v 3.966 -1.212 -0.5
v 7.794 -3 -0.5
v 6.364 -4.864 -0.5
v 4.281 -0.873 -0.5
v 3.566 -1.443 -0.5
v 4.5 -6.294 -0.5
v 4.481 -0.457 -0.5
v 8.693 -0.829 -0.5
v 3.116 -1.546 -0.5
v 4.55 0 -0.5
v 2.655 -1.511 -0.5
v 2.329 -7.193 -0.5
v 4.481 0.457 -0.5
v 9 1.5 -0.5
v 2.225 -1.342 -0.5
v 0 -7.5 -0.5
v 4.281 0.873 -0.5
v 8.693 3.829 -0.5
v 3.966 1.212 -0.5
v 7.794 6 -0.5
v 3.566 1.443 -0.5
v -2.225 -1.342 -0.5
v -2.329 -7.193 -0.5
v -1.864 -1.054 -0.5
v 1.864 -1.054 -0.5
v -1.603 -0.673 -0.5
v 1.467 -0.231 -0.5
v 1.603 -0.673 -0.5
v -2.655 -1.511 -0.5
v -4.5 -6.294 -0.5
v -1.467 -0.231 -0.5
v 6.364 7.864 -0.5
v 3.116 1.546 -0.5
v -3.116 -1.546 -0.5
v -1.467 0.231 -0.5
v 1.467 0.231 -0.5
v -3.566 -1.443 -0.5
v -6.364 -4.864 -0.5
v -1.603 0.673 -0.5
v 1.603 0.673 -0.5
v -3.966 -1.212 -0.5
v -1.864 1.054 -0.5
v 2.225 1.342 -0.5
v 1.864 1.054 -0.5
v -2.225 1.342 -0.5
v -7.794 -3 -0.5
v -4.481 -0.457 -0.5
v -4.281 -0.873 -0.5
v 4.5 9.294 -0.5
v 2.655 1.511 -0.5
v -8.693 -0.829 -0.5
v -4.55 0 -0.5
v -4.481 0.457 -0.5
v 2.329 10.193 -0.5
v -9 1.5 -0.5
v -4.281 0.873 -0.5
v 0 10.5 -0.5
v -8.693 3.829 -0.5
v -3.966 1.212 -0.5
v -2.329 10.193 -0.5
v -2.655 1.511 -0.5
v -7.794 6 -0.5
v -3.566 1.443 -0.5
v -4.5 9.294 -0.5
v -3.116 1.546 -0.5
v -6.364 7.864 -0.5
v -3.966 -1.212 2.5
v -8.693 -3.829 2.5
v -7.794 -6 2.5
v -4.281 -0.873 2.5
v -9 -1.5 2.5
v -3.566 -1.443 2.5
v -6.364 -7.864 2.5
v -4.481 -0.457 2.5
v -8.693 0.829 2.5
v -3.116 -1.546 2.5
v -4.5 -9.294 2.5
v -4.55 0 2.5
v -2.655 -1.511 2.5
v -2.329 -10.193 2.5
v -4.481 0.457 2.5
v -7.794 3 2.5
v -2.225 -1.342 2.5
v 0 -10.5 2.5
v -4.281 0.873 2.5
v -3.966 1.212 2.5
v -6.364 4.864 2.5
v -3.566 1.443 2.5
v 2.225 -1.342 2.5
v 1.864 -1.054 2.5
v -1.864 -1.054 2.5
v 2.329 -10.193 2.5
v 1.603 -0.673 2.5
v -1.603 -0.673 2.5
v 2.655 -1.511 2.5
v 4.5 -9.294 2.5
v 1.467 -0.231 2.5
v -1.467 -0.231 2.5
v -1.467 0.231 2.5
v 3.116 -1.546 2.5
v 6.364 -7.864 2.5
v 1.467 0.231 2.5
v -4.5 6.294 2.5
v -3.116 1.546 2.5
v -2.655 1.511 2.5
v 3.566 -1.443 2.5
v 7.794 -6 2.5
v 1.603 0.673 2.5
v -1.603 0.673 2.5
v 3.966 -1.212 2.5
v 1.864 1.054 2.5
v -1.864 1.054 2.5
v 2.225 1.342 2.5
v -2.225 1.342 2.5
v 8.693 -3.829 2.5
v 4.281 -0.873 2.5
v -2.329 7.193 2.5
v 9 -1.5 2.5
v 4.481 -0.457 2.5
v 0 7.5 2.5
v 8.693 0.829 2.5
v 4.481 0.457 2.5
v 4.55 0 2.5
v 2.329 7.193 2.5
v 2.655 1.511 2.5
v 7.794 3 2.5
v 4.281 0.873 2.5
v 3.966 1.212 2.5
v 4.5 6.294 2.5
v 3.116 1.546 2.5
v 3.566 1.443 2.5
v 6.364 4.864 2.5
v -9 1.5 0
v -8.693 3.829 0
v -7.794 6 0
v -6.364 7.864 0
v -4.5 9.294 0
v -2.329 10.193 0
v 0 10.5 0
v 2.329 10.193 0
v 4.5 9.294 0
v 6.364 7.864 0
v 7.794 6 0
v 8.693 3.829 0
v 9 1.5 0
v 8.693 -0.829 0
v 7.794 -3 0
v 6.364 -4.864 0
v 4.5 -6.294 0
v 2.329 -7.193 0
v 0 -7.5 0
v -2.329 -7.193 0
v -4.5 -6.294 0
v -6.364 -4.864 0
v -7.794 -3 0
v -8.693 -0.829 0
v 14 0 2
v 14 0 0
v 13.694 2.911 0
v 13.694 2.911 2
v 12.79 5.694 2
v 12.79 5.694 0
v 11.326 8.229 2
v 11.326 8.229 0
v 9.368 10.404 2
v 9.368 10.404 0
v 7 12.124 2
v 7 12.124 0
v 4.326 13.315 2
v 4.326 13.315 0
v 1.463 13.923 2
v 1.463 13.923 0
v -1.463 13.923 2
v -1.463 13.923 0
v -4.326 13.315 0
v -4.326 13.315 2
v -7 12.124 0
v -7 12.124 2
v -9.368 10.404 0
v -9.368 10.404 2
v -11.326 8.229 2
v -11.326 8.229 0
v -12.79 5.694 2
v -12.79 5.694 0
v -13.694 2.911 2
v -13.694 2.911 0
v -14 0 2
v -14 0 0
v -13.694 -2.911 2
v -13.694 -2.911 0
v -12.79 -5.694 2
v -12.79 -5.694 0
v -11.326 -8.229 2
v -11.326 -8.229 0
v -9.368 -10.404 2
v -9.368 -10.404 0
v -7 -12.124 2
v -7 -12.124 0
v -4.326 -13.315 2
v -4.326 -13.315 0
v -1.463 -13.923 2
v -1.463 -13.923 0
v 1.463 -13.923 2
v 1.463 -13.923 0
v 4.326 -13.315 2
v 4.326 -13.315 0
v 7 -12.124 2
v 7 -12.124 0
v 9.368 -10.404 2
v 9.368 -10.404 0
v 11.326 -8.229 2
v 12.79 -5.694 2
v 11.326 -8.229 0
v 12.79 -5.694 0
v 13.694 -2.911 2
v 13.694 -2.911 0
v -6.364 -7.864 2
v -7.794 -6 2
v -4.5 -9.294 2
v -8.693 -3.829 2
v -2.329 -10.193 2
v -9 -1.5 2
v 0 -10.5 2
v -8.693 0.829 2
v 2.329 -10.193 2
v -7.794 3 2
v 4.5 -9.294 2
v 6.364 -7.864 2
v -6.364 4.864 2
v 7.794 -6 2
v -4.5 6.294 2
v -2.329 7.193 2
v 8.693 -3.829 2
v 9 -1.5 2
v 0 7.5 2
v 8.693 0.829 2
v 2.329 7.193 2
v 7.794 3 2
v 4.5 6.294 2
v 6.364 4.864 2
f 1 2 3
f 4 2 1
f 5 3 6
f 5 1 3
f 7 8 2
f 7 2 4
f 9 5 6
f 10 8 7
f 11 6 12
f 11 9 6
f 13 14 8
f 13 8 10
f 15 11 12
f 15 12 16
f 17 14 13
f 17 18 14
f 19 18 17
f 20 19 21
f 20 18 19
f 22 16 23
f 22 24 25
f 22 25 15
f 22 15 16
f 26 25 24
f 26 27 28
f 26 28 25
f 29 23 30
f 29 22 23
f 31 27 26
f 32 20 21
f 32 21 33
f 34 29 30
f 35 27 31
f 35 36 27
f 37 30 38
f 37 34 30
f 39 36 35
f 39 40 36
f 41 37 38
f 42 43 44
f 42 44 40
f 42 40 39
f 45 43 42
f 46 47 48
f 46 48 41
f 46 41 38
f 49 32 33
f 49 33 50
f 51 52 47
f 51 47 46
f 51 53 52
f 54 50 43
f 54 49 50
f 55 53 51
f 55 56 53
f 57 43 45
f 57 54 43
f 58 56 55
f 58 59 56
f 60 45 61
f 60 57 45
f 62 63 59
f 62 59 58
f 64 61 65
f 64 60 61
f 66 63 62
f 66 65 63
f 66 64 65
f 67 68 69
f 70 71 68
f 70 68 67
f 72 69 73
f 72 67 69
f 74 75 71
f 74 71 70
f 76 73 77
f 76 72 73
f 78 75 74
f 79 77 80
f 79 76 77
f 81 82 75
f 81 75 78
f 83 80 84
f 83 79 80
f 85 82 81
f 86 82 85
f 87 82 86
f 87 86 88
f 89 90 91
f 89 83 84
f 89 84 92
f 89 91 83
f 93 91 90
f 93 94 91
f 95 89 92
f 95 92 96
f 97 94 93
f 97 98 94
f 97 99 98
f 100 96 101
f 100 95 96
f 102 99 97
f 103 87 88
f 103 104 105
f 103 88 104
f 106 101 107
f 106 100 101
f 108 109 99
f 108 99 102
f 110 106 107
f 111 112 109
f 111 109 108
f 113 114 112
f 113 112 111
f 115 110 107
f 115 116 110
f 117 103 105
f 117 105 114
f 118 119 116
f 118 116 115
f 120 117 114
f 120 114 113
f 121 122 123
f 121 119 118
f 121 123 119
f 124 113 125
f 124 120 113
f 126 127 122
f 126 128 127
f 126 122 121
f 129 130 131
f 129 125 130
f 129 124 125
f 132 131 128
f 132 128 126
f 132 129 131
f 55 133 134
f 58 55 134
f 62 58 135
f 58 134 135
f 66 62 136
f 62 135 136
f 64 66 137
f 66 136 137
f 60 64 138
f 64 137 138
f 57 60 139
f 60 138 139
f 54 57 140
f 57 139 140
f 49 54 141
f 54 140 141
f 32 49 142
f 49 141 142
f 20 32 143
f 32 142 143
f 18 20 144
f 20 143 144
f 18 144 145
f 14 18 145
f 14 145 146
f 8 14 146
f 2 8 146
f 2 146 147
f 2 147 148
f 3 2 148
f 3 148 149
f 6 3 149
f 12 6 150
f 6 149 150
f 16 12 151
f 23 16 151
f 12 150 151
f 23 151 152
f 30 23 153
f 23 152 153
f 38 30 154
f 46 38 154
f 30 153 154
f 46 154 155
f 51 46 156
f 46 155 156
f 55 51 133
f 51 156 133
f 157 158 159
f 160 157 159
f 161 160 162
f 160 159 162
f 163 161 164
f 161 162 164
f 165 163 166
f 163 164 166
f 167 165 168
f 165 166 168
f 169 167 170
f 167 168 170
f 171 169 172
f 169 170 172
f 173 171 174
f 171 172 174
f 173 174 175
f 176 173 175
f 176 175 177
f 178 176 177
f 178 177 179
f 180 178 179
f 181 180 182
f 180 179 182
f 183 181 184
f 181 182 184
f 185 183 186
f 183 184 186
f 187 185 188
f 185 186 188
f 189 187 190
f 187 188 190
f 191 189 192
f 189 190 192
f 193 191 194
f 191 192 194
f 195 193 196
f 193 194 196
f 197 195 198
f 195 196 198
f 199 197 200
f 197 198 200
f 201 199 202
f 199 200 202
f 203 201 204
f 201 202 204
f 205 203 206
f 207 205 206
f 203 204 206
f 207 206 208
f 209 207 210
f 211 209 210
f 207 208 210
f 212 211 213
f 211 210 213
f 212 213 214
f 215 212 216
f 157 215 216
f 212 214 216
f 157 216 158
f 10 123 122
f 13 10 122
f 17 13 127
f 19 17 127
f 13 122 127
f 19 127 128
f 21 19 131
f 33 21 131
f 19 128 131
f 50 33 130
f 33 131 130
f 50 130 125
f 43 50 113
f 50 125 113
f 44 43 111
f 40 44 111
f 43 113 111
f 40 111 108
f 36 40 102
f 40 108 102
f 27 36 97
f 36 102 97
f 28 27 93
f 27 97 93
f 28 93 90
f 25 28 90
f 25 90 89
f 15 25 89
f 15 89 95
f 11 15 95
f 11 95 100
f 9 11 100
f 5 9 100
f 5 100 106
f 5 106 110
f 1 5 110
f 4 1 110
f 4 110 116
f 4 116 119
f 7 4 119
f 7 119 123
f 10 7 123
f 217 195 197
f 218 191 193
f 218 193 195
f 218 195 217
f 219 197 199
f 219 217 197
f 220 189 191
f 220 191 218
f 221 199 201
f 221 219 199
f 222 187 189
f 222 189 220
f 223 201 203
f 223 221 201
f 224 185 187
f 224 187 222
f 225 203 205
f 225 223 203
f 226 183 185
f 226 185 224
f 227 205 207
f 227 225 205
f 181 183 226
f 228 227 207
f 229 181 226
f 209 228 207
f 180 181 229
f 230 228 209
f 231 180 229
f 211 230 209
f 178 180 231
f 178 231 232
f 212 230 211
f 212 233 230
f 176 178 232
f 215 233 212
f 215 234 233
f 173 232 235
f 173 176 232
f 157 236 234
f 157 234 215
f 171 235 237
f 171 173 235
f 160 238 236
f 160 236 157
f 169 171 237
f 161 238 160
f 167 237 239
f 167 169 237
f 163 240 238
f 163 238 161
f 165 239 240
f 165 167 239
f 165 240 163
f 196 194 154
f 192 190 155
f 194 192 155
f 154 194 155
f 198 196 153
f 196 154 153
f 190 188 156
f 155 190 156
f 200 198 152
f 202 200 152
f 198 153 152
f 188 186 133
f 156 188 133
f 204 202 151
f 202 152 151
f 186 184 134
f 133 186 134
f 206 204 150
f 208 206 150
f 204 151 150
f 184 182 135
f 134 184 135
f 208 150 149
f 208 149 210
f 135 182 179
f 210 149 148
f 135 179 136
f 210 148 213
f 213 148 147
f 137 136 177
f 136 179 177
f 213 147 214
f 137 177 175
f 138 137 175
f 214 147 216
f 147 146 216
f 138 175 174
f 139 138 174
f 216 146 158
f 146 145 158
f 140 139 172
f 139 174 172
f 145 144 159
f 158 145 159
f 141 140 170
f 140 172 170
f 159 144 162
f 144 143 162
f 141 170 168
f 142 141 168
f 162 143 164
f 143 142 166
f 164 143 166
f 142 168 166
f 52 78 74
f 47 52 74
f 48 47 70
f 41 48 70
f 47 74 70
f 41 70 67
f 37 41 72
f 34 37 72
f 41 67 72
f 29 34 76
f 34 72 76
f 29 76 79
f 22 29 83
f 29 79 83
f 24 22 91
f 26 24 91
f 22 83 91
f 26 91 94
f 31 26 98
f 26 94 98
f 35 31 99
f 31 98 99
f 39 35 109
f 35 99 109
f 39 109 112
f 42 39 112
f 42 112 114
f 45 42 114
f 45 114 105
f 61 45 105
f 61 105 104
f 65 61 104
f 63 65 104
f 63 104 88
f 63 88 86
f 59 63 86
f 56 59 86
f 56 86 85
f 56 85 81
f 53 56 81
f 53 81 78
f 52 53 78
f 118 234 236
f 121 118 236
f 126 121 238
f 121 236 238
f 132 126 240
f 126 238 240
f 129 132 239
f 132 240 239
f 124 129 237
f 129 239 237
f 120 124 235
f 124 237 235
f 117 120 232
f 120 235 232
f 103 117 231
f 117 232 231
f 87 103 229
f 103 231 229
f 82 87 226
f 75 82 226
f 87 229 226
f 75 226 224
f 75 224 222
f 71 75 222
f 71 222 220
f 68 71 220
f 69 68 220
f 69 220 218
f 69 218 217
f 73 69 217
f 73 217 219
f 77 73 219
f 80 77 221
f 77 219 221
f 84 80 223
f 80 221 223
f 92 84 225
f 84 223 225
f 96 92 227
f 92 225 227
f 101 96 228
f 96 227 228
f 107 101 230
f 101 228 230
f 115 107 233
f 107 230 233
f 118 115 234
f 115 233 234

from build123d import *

# Parameters (mm, degrees)
SKETCH1_R           = 14
BOSS_EXTRUDE1_DEPTH = 2
SKETCH2_R           = 9
BOSS_EXTRUDE2_DEPTH = 0.5
SKETCH6_R           = 9
BOSS_EXTRUDE4_DEPTH = 0.5
SKETCH7_R           = 1.55
CUT_EXTRUDE1_DEPTH  = 21.024984395


with BuildPart() as part:
    # Sketch1 → Boss-Extrude1 (new body)
    with BuildSketch(Plane.XY):
        Circle(SKETCH1_R)
    extrude(amount=BOSS_EXTRUDE1_DEPTH)

    # Sketch2 → Boss-Extrude2 (add)
    with BuildSketch(Plane.XY.offset(2)):
        with Locations((0, -1.5)):
            Circle(SKETCH2_R)
    extrude(amount=BOSS_EXTRUDE2_DEPTH)

    # Sketch6 → Boss-Extrude4 (add)
    with BuildSketch(Plane(origin=(0, 0, 0), x_dir=(-1, 0, 0), z_dir=(0, 0, -1))):
        with Locations((0, 1.5)):
            Circle(SKETCH6_R)
    extrude(amount=BOSS_EXTRUDE4_DEPTH)

    # Sketch7 → Cut-Extrude1 (cut, through all)
    with BuildSketch(Plane.XY.offset(2.5)):
        with Locations((3, 0)):
            Circle(SKETCH7_R)
        with Locations(Location((-3, 0, 0), (0, 0, 180))):
            Circle(SKETCH7_R)
    extrude(amount=-CUT_EXTRUDE1_DEPTH, mode=Mode.SUBTRACT)


solid = part.part
